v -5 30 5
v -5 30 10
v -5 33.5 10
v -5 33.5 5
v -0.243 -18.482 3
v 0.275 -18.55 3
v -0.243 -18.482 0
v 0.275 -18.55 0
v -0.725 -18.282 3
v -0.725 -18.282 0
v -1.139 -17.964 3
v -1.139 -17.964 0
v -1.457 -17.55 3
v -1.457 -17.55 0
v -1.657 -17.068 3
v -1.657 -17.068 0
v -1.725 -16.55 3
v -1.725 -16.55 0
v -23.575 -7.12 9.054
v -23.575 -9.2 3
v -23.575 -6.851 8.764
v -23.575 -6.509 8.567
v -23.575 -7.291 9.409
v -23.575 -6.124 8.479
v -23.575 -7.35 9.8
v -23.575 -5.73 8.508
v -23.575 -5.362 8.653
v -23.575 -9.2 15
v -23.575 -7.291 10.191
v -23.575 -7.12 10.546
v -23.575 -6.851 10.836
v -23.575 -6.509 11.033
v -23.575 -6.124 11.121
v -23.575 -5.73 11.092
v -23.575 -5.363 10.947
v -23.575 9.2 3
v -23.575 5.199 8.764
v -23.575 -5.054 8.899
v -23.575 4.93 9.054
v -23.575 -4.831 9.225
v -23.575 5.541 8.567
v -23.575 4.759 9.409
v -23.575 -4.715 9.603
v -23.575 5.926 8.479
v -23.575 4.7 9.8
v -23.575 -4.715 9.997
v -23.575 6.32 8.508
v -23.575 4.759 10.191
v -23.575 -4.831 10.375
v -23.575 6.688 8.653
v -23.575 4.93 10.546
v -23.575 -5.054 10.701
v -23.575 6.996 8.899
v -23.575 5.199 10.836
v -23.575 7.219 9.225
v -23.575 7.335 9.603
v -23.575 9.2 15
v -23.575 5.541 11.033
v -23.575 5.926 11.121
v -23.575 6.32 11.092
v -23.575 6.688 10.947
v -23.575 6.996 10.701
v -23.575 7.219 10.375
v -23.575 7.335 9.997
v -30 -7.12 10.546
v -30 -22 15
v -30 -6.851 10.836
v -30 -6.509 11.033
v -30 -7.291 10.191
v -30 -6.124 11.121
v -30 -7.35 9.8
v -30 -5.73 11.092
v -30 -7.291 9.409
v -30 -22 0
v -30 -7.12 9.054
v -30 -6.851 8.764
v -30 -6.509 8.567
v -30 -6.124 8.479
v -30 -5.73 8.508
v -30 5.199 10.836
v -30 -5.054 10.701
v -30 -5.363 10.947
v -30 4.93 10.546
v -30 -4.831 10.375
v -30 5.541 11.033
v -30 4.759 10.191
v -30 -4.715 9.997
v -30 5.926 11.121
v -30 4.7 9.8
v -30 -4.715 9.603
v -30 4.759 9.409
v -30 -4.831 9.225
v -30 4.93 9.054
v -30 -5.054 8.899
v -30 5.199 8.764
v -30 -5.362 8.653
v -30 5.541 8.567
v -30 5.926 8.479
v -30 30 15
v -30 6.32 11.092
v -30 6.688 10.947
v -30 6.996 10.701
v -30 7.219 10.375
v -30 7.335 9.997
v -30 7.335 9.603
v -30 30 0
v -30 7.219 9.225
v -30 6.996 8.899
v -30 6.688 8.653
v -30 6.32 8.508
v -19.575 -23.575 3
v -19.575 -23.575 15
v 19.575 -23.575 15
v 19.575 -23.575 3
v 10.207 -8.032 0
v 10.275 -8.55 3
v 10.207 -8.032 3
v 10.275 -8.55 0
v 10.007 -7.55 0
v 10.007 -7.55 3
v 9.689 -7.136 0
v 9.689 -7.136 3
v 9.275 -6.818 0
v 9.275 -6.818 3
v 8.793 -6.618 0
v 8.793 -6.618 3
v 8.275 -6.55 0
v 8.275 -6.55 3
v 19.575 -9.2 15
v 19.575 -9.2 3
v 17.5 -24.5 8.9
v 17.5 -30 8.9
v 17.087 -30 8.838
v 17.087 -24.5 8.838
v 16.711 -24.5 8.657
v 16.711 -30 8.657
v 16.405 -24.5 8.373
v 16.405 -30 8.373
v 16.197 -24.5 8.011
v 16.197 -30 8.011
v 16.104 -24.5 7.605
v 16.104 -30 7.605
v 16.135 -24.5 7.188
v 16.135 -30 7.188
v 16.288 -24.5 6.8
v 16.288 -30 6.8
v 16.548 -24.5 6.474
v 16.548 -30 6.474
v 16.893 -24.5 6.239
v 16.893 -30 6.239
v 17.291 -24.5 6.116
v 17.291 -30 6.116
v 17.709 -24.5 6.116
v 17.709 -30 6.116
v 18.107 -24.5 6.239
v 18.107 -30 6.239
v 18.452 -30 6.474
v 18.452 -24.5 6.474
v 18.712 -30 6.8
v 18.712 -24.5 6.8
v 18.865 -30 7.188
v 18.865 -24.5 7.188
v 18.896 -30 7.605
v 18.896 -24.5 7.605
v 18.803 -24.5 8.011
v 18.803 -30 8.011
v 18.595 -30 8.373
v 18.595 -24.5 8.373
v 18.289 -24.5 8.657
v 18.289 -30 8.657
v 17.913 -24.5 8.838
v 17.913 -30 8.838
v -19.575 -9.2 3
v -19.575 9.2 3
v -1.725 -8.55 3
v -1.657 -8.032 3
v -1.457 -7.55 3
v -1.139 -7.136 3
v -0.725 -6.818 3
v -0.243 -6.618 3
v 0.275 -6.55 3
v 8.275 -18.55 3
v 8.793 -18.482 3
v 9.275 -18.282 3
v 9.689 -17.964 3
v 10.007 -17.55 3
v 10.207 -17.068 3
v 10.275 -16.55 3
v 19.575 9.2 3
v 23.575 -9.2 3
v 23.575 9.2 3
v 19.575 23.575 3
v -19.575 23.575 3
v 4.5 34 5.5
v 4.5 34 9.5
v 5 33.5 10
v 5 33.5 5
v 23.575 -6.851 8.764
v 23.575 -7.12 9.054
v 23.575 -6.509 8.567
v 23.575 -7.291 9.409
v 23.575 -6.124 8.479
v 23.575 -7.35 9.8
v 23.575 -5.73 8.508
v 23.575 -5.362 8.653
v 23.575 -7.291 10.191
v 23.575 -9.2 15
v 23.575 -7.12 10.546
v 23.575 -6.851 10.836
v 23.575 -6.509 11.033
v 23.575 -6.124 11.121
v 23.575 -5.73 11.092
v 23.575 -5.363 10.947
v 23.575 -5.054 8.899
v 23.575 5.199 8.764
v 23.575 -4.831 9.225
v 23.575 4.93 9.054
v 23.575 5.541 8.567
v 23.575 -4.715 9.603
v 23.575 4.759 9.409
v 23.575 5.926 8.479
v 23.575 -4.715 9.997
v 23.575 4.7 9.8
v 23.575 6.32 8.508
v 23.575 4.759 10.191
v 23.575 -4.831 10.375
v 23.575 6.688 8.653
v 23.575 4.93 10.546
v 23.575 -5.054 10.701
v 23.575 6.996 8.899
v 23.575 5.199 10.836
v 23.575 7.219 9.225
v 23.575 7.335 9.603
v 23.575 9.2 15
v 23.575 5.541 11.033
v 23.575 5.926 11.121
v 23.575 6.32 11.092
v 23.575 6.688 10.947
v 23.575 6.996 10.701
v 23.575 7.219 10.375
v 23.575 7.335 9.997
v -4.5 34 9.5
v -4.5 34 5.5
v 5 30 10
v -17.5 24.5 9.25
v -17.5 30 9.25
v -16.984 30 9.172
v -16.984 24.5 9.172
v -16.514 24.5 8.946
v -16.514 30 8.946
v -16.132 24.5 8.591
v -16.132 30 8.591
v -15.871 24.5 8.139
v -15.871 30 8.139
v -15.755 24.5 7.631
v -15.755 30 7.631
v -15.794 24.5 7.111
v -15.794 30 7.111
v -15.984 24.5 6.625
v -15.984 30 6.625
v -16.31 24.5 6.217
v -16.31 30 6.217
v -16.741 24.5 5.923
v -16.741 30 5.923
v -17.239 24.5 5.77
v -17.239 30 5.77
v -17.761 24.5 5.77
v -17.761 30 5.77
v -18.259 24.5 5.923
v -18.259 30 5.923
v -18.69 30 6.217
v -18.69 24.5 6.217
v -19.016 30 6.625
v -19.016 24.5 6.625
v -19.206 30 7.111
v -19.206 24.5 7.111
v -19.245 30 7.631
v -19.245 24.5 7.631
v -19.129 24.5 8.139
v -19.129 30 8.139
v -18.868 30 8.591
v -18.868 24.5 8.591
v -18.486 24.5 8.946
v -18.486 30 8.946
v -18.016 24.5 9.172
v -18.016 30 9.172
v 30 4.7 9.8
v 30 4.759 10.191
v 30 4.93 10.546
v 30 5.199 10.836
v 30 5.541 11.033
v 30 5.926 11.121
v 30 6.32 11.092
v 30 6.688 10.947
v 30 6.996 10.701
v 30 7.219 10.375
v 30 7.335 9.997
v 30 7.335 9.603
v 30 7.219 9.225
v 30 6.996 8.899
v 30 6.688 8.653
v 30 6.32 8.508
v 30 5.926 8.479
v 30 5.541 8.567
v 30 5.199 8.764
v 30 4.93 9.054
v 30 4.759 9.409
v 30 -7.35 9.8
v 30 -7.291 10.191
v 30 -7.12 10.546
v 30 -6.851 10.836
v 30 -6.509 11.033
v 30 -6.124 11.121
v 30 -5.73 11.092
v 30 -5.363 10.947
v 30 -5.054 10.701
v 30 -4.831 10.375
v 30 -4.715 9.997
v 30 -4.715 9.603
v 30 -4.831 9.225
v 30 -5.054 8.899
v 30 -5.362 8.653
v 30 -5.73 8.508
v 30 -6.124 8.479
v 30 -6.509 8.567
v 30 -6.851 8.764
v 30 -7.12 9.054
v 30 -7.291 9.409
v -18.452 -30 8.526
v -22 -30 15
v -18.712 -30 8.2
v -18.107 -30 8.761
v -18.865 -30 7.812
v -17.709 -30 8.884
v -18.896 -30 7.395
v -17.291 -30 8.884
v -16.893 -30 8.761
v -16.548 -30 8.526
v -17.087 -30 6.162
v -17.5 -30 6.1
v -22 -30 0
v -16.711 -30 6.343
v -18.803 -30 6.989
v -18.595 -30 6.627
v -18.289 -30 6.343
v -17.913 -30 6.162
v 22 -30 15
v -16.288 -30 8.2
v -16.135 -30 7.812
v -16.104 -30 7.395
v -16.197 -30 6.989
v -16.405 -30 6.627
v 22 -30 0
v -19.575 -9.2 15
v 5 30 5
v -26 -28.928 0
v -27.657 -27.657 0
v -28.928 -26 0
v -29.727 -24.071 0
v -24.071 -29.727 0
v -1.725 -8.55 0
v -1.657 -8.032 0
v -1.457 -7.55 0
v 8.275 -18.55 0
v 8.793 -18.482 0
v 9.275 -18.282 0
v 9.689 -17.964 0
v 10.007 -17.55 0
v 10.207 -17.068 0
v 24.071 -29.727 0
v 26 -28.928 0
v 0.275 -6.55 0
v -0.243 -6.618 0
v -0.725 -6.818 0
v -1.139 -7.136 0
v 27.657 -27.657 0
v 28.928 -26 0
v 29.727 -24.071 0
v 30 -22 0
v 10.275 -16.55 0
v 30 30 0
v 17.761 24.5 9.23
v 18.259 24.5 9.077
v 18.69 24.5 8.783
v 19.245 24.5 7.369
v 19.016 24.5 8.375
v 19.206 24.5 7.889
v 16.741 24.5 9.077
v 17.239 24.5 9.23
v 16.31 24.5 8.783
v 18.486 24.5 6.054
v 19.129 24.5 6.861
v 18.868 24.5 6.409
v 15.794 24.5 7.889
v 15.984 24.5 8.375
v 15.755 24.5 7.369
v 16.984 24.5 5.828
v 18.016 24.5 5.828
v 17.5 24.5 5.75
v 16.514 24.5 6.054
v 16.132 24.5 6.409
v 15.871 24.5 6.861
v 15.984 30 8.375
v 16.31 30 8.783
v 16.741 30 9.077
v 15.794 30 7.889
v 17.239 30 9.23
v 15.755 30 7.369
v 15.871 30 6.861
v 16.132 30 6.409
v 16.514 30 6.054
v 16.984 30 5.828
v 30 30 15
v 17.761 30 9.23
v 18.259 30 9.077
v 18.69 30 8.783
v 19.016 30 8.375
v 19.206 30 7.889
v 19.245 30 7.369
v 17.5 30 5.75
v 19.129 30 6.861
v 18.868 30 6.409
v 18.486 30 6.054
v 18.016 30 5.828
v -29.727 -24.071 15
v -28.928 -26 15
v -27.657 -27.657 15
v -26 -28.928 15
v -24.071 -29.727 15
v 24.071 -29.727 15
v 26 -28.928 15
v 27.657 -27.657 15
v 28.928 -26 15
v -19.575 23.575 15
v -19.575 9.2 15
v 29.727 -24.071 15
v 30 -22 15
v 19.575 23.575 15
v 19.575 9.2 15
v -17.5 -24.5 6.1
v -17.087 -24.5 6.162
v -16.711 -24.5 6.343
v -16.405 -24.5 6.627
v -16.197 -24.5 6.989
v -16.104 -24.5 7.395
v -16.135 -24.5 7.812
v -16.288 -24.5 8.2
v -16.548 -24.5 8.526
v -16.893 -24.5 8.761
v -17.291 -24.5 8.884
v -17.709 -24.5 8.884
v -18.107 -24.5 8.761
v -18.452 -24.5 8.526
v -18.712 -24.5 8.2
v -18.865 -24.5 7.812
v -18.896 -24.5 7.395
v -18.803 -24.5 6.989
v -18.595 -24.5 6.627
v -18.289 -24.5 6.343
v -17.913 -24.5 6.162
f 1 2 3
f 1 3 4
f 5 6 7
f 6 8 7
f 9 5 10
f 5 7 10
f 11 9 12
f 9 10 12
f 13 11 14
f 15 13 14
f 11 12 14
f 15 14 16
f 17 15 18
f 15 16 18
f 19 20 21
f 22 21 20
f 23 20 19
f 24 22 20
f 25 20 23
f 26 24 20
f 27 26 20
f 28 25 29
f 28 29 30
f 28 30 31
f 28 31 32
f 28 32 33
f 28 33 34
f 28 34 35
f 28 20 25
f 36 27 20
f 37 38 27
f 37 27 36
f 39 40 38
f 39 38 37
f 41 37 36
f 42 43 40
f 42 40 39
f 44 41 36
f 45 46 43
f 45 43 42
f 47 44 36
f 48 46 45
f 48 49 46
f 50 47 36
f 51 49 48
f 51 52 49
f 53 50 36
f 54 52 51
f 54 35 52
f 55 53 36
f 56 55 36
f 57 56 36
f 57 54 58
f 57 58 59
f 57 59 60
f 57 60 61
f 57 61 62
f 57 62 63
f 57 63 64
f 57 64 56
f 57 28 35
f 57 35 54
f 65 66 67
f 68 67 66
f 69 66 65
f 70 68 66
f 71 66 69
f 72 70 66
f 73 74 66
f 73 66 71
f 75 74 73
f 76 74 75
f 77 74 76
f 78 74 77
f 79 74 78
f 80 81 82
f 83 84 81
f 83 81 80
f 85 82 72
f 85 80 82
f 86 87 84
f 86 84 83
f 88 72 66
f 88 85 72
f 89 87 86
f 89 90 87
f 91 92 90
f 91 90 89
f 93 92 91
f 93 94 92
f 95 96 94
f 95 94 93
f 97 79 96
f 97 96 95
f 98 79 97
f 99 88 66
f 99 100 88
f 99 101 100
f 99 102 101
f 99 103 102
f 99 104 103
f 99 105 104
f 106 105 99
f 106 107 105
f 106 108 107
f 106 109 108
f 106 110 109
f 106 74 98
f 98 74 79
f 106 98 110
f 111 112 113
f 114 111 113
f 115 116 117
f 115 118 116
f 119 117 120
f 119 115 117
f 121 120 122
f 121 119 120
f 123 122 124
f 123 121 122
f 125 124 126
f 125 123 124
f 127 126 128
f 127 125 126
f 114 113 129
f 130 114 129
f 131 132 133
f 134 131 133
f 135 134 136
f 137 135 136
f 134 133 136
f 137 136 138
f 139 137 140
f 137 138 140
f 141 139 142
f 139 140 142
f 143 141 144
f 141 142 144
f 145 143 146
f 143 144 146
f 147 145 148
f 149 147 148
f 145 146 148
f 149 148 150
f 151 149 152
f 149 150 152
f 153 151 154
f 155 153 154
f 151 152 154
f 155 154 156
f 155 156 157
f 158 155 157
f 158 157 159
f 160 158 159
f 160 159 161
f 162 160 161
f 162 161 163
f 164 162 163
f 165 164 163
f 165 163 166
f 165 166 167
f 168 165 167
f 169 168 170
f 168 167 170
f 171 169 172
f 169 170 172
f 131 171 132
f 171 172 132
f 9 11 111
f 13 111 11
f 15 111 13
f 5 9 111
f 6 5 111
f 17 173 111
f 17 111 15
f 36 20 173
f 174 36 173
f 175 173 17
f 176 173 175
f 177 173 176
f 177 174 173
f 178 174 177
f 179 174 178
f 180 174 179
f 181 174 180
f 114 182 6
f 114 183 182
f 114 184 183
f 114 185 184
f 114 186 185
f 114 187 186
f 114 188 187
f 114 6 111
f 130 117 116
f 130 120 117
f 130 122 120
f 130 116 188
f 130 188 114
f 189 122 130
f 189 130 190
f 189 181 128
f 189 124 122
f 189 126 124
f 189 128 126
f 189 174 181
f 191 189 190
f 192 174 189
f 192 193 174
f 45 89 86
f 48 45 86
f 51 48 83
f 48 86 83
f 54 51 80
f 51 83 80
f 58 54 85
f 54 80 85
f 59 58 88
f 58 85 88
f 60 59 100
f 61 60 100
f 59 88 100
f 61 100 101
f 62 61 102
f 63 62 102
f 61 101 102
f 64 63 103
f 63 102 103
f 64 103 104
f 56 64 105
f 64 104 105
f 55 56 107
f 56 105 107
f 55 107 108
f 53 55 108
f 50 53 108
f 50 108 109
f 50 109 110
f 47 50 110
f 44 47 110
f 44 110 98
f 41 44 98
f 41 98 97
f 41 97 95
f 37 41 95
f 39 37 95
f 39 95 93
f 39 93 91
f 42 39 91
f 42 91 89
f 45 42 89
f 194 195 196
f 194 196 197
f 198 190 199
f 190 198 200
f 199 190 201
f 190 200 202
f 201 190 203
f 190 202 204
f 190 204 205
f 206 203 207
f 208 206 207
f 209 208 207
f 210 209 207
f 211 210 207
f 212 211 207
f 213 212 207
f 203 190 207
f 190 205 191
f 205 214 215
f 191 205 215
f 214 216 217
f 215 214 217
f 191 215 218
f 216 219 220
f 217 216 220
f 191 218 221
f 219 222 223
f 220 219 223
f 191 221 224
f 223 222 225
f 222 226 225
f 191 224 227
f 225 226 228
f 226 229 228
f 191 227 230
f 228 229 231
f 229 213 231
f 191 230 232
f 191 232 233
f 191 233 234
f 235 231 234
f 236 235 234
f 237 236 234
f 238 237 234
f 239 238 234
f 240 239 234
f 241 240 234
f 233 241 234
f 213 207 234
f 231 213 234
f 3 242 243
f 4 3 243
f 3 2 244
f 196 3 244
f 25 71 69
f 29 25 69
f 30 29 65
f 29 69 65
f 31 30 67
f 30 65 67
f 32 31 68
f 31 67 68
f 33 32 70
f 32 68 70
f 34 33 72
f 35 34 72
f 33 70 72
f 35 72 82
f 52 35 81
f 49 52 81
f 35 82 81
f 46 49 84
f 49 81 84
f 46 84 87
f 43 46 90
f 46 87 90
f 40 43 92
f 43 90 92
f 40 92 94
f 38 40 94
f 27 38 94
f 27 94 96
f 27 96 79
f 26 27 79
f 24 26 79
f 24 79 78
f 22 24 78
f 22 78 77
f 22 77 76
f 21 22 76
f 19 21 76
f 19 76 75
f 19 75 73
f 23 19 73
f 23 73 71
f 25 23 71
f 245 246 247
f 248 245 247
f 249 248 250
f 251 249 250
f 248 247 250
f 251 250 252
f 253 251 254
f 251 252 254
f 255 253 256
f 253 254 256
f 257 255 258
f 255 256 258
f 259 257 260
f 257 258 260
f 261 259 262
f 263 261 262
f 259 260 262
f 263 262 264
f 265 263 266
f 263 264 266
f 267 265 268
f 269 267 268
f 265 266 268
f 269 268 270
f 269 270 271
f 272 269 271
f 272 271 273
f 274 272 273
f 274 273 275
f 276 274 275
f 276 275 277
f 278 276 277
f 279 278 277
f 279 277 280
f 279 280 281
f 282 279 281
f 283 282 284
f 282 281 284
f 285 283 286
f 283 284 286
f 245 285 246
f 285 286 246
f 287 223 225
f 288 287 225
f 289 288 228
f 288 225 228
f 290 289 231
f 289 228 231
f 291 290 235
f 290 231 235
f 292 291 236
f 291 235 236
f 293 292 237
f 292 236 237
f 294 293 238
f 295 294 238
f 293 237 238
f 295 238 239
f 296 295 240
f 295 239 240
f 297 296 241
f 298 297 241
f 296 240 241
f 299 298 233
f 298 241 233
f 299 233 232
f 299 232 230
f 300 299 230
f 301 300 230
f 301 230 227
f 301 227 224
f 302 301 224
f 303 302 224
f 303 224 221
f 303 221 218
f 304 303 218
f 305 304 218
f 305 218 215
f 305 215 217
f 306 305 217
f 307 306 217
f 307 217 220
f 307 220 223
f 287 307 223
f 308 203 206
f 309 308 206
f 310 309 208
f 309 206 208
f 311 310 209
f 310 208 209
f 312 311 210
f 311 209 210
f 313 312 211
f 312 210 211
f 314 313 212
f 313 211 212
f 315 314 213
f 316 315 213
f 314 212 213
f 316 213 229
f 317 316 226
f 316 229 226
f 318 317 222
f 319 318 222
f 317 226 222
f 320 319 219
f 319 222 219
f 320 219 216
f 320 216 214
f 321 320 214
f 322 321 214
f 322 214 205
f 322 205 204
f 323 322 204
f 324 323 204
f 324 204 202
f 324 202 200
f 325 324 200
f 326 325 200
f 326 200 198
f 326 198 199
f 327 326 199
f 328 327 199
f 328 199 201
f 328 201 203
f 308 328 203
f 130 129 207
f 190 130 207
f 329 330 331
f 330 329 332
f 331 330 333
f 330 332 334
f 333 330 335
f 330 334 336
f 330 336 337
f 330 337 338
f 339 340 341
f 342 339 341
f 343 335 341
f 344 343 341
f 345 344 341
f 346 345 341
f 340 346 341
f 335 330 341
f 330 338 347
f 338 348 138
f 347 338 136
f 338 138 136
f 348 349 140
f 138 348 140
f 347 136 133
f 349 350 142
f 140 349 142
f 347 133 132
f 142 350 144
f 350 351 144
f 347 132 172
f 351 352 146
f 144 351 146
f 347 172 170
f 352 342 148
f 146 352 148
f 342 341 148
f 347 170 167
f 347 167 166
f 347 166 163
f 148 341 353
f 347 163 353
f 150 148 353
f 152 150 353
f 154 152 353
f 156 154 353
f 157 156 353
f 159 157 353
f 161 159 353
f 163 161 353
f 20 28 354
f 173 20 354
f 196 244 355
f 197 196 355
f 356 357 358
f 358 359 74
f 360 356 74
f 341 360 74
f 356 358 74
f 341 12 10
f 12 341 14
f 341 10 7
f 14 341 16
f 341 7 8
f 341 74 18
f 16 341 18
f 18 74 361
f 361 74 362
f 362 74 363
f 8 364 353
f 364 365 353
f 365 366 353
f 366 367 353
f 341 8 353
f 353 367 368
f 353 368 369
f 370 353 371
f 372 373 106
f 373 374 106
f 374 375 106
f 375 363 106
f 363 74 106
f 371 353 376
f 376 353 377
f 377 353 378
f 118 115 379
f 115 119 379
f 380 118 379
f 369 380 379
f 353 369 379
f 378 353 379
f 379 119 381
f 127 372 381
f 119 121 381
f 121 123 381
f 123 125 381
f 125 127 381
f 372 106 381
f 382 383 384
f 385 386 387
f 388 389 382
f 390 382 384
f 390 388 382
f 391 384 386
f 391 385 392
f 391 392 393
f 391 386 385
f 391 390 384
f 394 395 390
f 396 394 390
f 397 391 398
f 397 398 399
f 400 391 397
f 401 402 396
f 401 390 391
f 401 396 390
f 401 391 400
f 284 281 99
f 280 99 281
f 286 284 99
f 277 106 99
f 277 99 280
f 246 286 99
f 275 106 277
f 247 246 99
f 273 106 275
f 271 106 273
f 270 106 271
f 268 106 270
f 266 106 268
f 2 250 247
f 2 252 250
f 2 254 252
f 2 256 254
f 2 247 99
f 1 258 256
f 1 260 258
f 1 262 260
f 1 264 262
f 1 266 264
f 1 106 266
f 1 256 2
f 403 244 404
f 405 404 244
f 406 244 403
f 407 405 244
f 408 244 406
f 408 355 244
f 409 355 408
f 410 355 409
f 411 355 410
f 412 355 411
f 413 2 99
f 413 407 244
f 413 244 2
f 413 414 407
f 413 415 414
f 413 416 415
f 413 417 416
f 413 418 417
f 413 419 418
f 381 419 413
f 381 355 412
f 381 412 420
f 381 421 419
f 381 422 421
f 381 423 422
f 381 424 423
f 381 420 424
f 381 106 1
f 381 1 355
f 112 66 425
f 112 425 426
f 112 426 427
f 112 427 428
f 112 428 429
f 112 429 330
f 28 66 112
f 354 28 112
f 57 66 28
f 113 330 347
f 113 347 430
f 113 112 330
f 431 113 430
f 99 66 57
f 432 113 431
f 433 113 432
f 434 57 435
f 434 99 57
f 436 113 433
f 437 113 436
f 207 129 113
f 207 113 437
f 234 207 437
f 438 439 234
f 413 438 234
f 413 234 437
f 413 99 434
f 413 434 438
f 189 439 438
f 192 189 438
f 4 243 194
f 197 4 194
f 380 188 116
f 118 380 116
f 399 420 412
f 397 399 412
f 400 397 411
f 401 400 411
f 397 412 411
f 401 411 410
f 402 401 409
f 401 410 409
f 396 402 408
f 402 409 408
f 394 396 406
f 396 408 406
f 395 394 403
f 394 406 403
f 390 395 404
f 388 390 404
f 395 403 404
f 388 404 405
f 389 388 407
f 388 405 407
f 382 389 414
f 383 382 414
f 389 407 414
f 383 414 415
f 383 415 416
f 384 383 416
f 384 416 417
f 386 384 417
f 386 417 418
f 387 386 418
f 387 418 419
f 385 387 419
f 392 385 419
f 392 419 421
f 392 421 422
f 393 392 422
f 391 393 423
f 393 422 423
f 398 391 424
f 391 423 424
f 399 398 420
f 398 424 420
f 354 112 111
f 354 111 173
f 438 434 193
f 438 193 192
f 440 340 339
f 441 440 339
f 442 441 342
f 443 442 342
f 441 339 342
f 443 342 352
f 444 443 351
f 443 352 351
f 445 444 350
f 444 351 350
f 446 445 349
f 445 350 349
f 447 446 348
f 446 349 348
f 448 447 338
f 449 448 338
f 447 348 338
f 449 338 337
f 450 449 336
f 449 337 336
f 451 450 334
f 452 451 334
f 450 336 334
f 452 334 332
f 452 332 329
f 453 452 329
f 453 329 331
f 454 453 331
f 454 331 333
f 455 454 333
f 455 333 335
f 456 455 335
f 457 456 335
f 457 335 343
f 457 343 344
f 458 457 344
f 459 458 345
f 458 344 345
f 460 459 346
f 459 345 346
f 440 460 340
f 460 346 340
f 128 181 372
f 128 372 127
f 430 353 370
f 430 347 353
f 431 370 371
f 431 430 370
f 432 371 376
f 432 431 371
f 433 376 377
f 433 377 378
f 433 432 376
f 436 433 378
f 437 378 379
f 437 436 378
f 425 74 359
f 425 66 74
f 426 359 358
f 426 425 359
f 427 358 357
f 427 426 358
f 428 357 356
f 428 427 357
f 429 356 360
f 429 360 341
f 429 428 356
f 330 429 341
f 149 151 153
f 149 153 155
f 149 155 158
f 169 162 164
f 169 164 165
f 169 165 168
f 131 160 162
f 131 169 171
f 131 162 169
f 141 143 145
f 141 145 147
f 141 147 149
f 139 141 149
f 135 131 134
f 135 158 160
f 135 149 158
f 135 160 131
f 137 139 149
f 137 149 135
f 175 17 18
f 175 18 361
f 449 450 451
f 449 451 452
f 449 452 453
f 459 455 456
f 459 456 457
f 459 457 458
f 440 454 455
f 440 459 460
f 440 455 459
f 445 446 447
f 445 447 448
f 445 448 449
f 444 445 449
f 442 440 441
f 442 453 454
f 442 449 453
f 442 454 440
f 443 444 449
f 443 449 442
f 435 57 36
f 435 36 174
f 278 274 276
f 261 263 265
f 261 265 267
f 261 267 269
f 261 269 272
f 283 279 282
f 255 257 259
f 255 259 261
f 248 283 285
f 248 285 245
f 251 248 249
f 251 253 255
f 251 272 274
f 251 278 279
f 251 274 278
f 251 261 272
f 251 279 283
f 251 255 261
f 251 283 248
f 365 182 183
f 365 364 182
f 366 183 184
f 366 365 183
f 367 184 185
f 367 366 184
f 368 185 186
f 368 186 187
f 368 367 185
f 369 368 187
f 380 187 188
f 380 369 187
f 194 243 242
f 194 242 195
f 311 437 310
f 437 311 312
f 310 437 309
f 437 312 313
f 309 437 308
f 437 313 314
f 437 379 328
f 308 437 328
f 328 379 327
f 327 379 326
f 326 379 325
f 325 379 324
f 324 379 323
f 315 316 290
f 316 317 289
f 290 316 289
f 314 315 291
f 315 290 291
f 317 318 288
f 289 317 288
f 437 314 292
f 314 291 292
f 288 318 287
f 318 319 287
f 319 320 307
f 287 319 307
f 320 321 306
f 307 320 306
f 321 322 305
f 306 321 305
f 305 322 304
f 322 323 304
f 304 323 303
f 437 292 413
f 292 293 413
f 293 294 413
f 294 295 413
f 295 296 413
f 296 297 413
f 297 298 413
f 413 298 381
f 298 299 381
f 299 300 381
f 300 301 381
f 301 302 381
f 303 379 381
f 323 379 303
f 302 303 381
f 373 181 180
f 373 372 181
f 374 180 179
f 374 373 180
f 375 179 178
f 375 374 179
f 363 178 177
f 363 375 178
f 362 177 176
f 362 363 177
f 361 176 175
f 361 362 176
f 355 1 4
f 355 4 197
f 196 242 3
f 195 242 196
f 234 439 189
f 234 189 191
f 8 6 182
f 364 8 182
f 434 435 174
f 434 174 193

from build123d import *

# Parameters (mm, degrees)
SKETCH_3_W          = 60
SKETCH_3_H          = 60
EXTRUDE_1_DEPTH     = 15
SKETCH_4_W          = 47.15
SKETCH_4_H          = 47.15
CUT_EXTRUDE_1_DEPTH = 12
SKETCH_5_R          = 1.325
CUT_EXTRUDE_2_DEPTH = 69.738635424
EXTRUDE_2_REACH     = 47
SKETCH_6_W          = 4
SKETCH_6_H          = 14.375
FILLET_1_R          = 8
SKETCH_11_R         = 1.75
CUT_EXTRUDE_5_DEPTH = 5.5
SKETCH_12_R         = 1.4
CUT_EXTRUDE_6_DEPTH = 5.5
SKETCH_13_W         = 10
SKETCH_13_H         = 5
EXTRUDE_3_DEPTH     = 4
CHAMFER_1_SIZE      = 0.5
SKETCH_15_W         = 12
SKETCH_15_H         = 12
CUT_EXTRUDE_7_DEPTH = 47.904157598
FILLET_2_R          = 2


with BuildPart() as part:
    # 草图3 → 凸台-拉伸1 (new body)
    with BuildSketch(Plane.XY):
        Rectangle(SKETCH_3_W, SKETCH_3_H)
    extrude(amount=EXTRUDE_1_DEPTH)

    # 草图4 → 切除-拉伸1 (cut)
    with BuildSketch(Plane.XY.offset(15)):
        Rectangle(SKETCH_4_W, SKETCH_4_H)
    extrude(amount=-CUT_EXTRUDE_1_DEPTH, mode=Mode.SUBTRACT)

    # 草图5 → 切除-拉伸2 (cut, through all)
    with BuildSketch(Plane.ZY.offset(30)):
        with Locations(Location((9.8, 6.025, 0), (0, 0, 270))):
            Circle(SKETCH_5_R)
        with Locations(Location((9.8, -6.025, 0), (0, 0, 270))):
            Circle(SKETCH_5_R)
    extrude(amount=-CUT_EXTRUDE_2_DEPTH, mode=Mode.SUBTRACT)

    # 草图6 → 凸台-拉伸2 (add, up to next)
    with BuildSketch(Plane.XY.offset(15), mode=Mode.PRIVATE) as extrude_2_sk1:
        with Locations((-21.575, 16.3875)):
            Rectangle(SKETCH_6_W, SKETCH_6_H)
    extrude_2_tool1 = extrude(extrude_2_sk1.sketch, amount=-EXTRUDE_2_REACH, mode=Mode.PRIVATE) - part.part
    # 草图6 → 凸台-拉伸2 (add, up to next)
    with BuildSketch(Plane.XY.offset(15), mode=Mode.PRIVATE) as extrude_2_sk2:
        with Locations((21.575, 16.3875)):
            Rectangle(SKETCH_6_W, SKETCH_6_H)
    extrude_2_tool2 = extrude(extrude_2_sk2.sketch, amount=-EXTRUDE_2_REACH, mode=Mode.PRIVATE) - part.part
    # 草图6 → 凸台-拉伸2 (add, up to next)
    with BuildSketch(Plane.XY.offset(15), mode=Mode.PRIVATE) as extrude_2_sk3:
        with Locations((21.575, -16.3875)):
            Rectangle(SKETCH_6_W, SKETCH_6_H)
    extrude_2_tool3 = extrude(extrude_2_sk3.sketch, amount=-EXTRUDE_2_REACH, mode=Mode.PRIVATE) - part.part
    # 草图6 → 凸台-拉伸2 (add, up to next)
    with BuildSketch(Plane.XY.offset(15), mode=Mode.PRIVATE) as extrude_2_sk4:
        with Locations((-21.575, -16.3875)):
            Rectangle(SKETCH_6_W, SKETCH_6_H)
    extrude_2_tool4 = extrude(extrude_2_sk4.sketch, amount=-EXTRUDE_2_REACH, mode=Mode.PRIVATE) - part.part
    add(extrude_2_tool1.solids().sort_by_distance((-21.575, 16.3875, 15))[0])
    add(extrude_2_tool2.solids().sort_by_distance((21.575, 16.3875, 15))[0])
    add(extrude_2_tool3.solids().sort_by_distance((21.575, -16.3875, 15))[0])
    add(extrude_2_tool4.solids().sort_by_distance((-21.575, -16.3875, 15))[0])

    # 圆角1
    fillet_1_edges = [part.edges().sort_by_distance(p)[0] for p in [
        (30, -30, 7.5),
        (-30, -30, 7.5),
    ]]
    fillet(fillet_1_edges, radius=FILLET_1_R)

    # 草图11 → 切除-拉伸5 (cut)
    with BuildSketch(Plane(origin=(0, 30, 0), x_dir=(1, 0, 0), z_dir=(0, 1, 0))):
        with Locations(Location((-17.5, -7.5, 0), (0, 0, 270))):
            Circle(SKETCH_11_R)
        with Locations(Location((17.5, -7.5, 0), (0, 0, 90))):
            Circle(SKETCH_11_R)
    extrude(amount=-CUT_EXTRUDE_5_DEPTH, mode=Mode.SUBTRACT)

    # 草图12 → 切除-拉伸6 (cut)
    with BuildSketch(Plane.XZ.offset(30)):
        with Locations(Location((-17.5, 7.5, 0), (0, 0, 270))):
            Circle(SKETCH_12_R)
        with Locations(Location((17.5, 7.5, 0), (0, 0, 90))):
            Circle(SKETCH_12_R)
    extrude(amount=-CUT_EXTRUDE_6_DEPTH, mode=Mode.SUBTRACT)

    # 草图13 → 凸台-拉伸3 (add)
    with BuildSketch(Plane(origin=(0, 30, 0), x_dir=(1, 0, 0), z_dir=(0, 1, 0))):
        with Locations((0, -7.5)):
            Rectangle(SKETCH_13_W, SKETCH_13_H)
    extrude(amount=EXTRUDE_3_DEPTH)

    # 倒角1
    chamfer_1_edges = [part.edges().sort_by_distance(p)[0] for p in [
        (5, 34, 7.5),
        (0, 34, 5),
        (-5, 34, 7.5),
        (0, 34, 10),
    ]]
    chamfer(chamfer_1_edges, length=CHAMFER_1_SIZE)

    # 草图15 → 切除-拉伸7 (cut, through all)
    with BuildSketch(Plane.XY.offset(3)):
        with Locations((4.275, -12.55)):
            Rectangle(SKETCH_15_W, SKETCH_15_H)
    extrude(amount=-CUT_EXTRUDE_7_DEPTH, mode=Mode.SUBTRACT)

    # 圆角2
    fillet_2_edges = [part.edges().sort_by_distance(p)[0] for p in [
        (-1.725, -18.55, 1.5),
        (-1.725, -6.55, 1.5),
        (10.275, -6.55, 1.5),
        (10.275, -18.55, 1.5),
    ]]
    fillet(fillet_2_edges, radius=FILLET_2_R)


solid = part.part
